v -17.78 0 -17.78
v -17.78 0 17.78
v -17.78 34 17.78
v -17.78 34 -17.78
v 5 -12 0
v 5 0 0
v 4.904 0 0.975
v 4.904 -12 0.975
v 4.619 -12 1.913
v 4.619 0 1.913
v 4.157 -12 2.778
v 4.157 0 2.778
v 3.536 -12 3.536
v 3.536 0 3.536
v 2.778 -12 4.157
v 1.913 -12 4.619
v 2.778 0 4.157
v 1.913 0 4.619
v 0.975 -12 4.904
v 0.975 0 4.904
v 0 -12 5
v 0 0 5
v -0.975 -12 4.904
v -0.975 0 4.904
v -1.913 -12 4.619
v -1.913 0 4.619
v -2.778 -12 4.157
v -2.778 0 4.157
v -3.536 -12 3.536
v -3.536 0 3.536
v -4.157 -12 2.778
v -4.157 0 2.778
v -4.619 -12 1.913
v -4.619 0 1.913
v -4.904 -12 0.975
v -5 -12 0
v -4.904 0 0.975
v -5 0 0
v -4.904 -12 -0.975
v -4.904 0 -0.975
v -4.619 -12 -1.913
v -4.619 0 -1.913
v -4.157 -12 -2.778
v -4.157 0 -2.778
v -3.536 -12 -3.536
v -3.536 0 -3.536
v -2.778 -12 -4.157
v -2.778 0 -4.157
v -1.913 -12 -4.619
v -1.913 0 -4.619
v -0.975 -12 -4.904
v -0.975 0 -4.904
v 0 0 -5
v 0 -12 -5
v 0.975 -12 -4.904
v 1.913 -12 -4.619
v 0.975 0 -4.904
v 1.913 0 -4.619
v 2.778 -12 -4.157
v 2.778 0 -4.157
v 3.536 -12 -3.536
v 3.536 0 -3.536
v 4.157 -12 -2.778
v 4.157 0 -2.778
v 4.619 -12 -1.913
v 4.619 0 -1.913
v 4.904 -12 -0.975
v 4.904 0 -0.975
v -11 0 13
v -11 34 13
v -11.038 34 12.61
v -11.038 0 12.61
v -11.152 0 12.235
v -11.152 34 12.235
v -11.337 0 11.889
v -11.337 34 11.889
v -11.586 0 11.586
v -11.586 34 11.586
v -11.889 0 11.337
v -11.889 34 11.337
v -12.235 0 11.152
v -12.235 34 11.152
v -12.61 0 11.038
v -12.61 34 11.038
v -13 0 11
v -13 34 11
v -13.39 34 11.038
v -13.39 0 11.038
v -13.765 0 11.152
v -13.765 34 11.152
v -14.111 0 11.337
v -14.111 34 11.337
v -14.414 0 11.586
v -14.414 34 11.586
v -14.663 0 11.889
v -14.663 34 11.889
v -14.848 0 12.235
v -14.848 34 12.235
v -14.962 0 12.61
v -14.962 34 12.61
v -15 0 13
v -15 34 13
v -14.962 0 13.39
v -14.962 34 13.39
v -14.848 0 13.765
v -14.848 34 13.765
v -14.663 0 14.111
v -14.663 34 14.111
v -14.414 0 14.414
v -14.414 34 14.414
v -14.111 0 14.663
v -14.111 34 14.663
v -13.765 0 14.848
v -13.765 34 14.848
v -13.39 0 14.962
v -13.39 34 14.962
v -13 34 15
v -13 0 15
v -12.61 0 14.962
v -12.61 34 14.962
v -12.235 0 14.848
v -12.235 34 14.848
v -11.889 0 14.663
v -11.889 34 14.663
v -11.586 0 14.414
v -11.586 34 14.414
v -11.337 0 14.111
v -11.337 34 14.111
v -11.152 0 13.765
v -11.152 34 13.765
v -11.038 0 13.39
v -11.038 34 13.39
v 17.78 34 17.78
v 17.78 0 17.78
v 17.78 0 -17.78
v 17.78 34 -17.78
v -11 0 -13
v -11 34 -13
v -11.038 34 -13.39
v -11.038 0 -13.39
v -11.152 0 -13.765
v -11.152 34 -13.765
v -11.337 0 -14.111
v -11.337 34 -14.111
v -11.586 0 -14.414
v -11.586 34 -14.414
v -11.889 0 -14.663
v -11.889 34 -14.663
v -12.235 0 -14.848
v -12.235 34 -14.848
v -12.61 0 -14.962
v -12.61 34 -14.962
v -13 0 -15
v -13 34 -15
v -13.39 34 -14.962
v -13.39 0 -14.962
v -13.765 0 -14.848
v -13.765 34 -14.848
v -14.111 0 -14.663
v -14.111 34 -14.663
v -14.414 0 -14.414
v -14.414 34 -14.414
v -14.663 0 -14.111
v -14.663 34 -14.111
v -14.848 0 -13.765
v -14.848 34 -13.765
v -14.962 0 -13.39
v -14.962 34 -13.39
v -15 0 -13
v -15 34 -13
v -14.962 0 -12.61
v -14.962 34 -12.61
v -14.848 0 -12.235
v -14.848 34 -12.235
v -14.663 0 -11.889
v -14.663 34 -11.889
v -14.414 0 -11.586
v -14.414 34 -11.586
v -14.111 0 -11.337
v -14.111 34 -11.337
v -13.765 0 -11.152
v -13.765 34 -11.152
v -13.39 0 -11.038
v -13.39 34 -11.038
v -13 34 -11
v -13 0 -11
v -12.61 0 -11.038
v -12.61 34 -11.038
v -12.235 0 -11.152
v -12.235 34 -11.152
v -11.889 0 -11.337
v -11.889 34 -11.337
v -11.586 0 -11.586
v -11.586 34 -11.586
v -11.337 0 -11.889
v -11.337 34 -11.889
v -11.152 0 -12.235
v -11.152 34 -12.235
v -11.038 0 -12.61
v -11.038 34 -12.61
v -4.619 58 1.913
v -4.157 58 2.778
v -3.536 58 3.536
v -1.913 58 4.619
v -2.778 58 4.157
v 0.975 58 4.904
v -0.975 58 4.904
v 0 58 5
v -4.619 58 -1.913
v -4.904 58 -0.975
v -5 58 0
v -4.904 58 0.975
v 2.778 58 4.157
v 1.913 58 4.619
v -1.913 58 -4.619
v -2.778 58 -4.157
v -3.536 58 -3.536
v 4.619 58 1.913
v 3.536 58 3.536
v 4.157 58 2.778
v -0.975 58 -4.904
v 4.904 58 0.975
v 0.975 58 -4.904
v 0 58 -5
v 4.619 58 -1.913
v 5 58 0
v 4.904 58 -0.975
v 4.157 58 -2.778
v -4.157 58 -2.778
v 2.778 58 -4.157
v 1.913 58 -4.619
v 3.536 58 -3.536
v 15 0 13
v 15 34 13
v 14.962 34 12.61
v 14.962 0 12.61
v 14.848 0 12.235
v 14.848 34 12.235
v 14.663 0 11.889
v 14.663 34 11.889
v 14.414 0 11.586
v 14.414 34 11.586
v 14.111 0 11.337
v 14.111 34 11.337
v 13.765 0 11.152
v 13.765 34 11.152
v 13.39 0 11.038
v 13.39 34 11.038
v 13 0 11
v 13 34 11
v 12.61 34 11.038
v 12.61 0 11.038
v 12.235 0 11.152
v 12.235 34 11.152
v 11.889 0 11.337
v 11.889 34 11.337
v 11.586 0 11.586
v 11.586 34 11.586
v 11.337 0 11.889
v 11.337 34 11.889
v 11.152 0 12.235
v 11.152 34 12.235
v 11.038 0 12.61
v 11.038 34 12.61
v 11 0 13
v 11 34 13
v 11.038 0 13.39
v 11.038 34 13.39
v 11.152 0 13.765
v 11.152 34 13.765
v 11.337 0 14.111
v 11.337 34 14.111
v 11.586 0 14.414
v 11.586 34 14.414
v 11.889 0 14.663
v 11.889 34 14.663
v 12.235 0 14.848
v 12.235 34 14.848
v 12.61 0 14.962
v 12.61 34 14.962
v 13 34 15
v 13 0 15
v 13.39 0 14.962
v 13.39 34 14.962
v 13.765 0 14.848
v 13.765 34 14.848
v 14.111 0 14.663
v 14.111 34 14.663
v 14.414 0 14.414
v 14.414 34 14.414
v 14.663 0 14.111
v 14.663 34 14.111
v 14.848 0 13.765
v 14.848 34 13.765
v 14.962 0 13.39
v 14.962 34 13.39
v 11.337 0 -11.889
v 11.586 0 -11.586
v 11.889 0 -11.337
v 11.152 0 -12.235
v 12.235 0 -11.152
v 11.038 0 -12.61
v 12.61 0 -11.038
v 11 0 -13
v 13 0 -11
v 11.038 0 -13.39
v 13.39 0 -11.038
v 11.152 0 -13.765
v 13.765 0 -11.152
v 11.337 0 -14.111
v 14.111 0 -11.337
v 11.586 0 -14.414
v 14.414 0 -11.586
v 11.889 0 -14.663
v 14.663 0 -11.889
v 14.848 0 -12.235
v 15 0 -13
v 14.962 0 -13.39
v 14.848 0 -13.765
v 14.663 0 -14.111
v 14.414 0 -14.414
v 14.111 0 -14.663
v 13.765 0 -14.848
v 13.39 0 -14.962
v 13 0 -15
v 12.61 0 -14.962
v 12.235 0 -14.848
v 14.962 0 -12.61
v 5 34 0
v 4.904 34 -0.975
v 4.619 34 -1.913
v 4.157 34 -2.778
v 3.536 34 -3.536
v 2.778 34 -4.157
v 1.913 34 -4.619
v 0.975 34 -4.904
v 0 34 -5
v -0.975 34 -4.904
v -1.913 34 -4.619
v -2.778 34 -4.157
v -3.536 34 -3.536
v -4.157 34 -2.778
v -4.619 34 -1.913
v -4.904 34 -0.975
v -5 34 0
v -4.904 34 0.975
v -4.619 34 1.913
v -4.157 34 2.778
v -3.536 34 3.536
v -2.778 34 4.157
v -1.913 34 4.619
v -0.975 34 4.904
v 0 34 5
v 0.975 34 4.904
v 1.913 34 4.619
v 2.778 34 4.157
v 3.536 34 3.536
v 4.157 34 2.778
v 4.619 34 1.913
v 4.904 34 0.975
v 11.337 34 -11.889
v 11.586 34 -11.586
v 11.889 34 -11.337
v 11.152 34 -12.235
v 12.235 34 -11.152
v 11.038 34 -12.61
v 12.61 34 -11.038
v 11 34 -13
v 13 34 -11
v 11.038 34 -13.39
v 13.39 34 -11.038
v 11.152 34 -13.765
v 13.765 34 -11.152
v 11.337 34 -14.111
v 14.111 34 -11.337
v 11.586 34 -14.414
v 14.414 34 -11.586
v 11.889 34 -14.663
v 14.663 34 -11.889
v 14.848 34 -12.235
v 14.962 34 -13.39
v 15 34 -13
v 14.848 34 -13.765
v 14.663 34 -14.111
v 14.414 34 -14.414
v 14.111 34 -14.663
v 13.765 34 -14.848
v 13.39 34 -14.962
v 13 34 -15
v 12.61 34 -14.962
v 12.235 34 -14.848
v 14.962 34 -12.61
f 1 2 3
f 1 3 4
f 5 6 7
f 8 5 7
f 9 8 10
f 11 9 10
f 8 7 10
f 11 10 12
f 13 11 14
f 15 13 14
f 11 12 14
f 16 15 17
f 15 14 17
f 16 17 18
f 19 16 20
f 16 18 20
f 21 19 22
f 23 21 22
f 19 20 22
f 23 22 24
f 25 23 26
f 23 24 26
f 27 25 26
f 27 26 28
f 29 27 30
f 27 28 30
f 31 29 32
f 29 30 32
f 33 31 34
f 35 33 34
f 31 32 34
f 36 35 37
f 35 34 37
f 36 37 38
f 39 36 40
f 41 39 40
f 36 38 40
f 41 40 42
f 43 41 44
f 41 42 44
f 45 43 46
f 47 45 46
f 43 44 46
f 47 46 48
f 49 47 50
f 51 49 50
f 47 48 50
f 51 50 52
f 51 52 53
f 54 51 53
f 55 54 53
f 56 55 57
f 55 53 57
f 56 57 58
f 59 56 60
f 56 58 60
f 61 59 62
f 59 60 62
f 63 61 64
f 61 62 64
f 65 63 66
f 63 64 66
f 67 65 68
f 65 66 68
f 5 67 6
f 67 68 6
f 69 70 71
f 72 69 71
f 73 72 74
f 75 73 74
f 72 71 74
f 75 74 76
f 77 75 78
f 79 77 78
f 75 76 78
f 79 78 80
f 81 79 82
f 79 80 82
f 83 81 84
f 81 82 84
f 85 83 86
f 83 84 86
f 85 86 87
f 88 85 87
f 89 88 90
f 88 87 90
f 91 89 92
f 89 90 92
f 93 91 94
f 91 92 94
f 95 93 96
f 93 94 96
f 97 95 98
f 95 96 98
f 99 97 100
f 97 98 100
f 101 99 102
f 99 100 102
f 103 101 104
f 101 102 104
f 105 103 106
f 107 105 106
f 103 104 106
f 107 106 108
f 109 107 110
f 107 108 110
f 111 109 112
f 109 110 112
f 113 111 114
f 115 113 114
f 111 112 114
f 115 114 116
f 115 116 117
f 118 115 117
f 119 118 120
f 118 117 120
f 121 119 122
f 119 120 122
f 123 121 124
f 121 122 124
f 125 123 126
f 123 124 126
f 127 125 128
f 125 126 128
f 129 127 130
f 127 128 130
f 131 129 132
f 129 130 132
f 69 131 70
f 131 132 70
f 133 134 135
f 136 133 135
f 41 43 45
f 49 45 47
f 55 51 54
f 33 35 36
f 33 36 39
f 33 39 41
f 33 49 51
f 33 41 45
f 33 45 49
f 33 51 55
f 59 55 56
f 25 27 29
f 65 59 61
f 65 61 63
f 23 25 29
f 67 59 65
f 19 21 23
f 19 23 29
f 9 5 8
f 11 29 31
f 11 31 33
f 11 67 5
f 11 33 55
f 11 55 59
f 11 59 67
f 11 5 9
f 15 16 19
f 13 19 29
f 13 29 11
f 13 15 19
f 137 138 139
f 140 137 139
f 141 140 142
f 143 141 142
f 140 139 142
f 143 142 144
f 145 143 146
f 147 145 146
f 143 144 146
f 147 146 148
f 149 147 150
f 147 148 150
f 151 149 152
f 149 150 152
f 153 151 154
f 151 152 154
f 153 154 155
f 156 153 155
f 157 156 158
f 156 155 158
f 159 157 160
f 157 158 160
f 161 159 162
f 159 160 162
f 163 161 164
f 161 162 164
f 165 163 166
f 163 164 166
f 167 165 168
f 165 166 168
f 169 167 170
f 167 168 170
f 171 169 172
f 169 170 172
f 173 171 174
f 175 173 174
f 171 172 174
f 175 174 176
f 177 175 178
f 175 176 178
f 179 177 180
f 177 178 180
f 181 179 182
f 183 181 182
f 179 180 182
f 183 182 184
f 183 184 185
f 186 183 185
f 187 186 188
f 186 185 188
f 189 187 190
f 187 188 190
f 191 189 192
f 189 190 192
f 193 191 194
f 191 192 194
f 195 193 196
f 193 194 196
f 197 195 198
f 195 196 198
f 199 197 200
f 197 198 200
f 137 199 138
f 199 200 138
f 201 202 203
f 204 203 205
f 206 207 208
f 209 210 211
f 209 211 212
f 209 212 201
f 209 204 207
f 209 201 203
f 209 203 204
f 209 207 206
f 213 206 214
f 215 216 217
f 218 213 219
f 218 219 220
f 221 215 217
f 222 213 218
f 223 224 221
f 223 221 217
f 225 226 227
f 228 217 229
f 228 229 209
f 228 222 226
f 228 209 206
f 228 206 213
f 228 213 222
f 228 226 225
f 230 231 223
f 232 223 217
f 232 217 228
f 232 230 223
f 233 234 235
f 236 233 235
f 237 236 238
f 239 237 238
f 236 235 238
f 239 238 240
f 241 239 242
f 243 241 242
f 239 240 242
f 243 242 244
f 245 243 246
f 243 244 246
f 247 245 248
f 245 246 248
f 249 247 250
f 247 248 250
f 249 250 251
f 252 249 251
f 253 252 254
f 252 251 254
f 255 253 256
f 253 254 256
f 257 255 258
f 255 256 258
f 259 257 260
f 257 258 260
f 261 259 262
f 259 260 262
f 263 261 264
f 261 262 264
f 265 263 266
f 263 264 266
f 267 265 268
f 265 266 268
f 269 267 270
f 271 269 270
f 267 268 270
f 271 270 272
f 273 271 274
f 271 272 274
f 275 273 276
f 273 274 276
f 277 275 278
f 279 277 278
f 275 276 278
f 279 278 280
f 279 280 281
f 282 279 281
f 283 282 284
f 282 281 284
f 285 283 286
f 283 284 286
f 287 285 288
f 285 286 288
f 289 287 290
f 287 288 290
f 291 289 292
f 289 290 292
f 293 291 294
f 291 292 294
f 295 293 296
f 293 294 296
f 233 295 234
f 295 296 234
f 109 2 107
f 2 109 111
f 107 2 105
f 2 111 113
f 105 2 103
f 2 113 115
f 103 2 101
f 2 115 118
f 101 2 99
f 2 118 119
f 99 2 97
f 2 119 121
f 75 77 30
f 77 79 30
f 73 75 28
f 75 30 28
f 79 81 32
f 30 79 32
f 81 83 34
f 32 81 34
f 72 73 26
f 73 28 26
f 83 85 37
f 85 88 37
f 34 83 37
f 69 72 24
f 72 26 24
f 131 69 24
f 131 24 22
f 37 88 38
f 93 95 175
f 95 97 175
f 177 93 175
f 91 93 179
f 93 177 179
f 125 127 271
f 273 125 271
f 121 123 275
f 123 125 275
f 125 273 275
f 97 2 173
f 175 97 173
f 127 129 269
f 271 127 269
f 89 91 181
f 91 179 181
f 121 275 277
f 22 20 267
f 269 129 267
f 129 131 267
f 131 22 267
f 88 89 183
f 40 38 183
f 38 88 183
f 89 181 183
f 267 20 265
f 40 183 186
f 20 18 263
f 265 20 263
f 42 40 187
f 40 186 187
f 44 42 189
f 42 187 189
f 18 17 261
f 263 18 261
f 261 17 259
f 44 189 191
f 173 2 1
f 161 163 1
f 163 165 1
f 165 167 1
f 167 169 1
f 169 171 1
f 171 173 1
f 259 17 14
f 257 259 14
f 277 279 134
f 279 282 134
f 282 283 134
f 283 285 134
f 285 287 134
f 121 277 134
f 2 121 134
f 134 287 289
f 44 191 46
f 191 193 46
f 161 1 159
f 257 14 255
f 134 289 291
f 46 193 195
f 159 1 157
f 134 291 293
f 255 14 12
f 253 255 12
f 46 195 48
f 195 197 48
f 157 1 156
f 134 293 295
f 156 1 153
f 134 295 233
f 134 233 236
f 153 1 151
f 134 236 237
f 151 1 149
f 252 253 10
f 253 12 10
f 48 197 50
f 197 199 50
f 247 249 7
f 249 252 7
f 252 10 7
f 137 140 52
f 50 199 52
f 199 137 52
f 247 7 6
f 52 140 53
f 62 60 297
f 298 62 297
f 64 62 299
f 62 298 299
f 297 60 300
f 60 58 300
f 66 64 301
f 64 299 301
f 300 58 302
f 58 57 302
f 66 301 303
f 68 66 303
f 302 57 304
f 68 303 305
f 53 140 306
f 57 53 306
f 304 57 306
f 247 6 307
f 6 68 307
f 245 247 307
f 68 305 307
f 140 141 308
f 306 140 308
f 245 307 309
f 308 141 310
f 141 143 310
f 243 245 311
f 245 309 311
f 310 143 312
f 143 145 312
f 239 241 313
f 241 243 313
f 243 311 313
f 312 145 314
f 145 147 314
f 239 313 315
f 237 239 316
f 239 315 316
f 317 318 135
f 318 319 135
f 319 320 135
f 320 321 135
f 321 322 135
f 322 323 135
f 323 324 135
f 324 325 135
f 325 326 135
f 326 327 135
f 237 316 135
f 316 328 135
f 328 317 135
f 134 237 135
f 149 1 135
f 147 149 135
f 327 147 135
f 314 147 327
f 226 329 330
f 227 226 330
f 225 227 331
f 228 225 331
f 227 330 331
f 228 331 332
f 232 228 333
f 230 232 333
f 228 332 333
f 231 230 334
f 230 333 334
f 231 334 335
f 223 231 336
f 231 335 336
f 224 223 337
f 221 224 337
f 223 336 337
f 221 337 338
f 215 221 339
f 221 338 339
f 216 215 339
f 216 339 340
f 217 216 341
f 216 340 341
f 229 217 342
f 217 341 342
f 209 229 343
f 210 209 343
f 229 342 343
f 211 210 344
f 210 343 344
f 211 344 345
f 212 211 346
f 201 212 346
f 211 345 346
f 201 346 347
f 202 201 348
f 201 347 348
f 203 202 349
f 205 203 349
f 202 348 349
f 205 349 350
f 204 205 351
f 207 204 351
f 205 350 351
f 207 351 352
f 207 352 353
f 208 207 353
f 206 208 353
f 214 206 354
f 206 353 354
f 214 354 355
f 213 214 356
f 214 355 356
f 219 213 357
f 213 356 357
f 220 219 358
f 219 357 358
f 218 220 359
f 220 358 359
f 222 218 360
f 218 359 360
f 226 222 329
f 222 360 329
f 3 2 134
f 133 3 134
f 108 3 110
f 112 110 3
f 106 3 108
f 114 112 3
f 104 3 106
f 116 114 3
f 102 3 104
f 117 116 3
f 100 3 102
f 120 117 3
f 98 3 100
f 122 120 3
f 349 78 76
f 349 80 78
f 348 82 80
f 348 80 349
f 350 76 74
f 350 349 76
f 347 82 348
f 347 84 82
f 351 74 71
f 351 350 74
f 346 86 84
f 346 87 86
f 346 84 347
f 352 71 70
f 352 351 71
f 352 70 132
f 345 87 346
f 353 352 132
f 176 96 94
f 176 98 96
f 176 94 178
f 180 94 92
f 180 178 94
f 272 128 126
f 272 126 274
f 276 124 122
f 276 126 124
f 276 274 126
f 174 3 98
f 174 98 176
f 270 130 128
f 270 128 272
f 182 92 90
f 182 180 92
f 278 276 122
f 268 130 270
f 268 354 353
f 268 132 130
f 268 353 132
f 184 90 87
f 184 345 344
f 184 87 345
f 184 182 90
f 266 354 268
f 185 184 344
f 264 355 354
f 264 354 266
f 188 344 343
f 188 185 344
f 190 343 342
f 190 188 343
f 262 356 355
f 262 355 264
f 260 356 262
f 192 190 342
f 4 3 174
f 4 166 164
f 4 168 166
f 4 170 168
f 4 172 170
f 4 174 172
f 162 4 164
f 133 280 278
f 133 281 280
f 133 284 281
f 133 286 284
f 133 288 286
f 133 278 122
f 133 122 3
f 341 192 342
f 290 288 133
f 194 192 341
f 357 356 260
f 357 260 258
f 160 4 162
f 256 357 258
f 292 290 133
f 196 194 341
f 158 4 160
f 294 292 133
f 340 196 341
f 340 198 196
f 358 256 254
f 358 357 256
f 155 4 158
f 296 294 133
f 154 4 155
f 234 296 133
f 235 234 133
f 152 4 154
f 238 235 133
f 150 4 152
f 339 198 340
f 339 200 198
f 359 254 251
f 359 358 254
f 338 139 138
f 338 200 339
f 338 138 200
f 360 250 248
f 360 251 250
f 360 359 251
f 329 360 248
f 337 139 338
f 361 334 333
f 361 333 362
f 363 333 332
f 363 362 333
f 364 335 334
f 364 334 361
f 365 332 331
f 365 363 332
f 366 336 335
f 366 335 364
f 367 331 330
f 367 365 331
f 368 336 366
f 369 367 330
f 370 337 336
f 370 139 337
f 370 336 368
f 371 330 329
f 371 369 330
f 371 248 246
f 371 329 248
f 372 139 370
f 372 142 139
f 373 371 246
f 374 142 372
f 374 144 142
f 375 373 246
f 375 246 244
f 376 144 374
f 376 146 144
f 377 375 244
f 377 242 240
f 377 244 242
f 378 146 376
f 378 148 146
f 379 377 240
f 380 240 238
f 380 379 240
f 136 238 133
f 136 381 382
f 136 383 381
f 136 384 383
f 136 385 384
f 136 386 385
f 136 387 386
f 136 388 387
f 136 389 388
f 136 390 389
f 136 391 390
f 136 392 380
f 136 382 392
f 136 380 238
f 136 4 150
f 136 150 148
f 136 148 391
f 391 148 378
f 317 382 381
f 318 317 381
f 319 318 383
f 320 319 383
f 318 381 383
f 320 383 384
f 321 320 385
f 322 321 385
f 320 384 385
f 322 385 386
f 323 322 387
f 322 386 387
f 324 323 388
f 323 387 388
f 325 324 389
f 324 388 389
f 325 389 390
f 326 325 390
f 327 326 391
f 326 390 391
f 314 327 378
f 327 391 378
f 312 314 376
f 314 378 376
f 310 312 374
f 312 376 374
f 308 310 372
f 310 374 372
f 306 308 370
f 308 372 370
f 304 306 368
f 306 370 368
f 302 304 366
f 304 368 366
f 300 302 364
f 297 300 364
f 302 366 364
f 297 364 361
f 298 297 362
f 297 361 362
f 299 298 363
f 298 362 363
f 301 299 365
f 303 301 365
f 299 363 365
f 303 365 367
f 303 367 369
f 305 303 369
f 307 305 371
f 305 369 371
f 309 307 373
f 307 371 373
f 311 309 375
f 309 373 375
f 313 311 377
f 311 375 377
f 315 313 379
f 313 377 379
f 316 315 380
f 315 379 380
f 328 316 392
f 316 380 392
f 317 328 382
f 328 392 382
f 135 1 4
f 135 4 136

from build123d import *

# Parameters (mm, degrees)
SKETCH1_W           = 35.56
SKETCH1_H           = 35.56
BOSS_EXTRUDE1_DEPTH = 34
SKETCH2_R           = 5
BOSS_EXTRUDE2_DEPTH = 24
SKETCH3_R           = 5
BOSS_EXTRUDE3_DEPTH = 12
SKETCH4_R           = 2
CUT_EXTRUDE1_DEPTH  = 34


with BuildPart() as part:
    # Sketch1 → Boss-Extrude1 (new body)
    with BuildSketch(Plane(origin=(0, 0, 0), x_dir=(1, 0, 0), z_dir=(0, 1, 0))):
        Rectangle(SKETCH1_W, SKETCH1_H)
    extrude(amount=BOSS_EXTRUDE1_DEPTH)

    # Sketch2 → Boss-Extrude2 (add)
    with BuildSketch(Plane(origin=(0, 34, 0), x_dir=(1, 0, 0), z_dir=(0, 1, 0))):
        Circle(SKETCH2_R)
    extrude(amount=BOSS_EXTRUDE2_DEPTH)

    # Sketch3 → Boss-Extrude3 (add)
    with BuildSketch(Plane.XZ):
        Circle(SKETCH3_R)
    extrude(amount=BOSS_EXTRUDE3_DEPTH)

    # Sketch4 → Cut-Extrude1 (cut)
    with BuildSketch(Plane(origin=(0, 34, 0), x_dir=(1, 0, 0), z_dir=(0, 1, 0))):
        with Locations((-13, 13)):
            Circle(SKETCH4_R)
        with Locations((13, 13)):
            Circle(SKETCH4_R)
        with Locations((13, -13)):
            Circle(SKETCH4_R)
        with Locations((-13, -13)):
            Circle(SKETCH4_R)
    extrude(amount=-CUT_EXTRUDE1_DEPTH, mode=Mode.SUBTRACT)


solid = part.part
